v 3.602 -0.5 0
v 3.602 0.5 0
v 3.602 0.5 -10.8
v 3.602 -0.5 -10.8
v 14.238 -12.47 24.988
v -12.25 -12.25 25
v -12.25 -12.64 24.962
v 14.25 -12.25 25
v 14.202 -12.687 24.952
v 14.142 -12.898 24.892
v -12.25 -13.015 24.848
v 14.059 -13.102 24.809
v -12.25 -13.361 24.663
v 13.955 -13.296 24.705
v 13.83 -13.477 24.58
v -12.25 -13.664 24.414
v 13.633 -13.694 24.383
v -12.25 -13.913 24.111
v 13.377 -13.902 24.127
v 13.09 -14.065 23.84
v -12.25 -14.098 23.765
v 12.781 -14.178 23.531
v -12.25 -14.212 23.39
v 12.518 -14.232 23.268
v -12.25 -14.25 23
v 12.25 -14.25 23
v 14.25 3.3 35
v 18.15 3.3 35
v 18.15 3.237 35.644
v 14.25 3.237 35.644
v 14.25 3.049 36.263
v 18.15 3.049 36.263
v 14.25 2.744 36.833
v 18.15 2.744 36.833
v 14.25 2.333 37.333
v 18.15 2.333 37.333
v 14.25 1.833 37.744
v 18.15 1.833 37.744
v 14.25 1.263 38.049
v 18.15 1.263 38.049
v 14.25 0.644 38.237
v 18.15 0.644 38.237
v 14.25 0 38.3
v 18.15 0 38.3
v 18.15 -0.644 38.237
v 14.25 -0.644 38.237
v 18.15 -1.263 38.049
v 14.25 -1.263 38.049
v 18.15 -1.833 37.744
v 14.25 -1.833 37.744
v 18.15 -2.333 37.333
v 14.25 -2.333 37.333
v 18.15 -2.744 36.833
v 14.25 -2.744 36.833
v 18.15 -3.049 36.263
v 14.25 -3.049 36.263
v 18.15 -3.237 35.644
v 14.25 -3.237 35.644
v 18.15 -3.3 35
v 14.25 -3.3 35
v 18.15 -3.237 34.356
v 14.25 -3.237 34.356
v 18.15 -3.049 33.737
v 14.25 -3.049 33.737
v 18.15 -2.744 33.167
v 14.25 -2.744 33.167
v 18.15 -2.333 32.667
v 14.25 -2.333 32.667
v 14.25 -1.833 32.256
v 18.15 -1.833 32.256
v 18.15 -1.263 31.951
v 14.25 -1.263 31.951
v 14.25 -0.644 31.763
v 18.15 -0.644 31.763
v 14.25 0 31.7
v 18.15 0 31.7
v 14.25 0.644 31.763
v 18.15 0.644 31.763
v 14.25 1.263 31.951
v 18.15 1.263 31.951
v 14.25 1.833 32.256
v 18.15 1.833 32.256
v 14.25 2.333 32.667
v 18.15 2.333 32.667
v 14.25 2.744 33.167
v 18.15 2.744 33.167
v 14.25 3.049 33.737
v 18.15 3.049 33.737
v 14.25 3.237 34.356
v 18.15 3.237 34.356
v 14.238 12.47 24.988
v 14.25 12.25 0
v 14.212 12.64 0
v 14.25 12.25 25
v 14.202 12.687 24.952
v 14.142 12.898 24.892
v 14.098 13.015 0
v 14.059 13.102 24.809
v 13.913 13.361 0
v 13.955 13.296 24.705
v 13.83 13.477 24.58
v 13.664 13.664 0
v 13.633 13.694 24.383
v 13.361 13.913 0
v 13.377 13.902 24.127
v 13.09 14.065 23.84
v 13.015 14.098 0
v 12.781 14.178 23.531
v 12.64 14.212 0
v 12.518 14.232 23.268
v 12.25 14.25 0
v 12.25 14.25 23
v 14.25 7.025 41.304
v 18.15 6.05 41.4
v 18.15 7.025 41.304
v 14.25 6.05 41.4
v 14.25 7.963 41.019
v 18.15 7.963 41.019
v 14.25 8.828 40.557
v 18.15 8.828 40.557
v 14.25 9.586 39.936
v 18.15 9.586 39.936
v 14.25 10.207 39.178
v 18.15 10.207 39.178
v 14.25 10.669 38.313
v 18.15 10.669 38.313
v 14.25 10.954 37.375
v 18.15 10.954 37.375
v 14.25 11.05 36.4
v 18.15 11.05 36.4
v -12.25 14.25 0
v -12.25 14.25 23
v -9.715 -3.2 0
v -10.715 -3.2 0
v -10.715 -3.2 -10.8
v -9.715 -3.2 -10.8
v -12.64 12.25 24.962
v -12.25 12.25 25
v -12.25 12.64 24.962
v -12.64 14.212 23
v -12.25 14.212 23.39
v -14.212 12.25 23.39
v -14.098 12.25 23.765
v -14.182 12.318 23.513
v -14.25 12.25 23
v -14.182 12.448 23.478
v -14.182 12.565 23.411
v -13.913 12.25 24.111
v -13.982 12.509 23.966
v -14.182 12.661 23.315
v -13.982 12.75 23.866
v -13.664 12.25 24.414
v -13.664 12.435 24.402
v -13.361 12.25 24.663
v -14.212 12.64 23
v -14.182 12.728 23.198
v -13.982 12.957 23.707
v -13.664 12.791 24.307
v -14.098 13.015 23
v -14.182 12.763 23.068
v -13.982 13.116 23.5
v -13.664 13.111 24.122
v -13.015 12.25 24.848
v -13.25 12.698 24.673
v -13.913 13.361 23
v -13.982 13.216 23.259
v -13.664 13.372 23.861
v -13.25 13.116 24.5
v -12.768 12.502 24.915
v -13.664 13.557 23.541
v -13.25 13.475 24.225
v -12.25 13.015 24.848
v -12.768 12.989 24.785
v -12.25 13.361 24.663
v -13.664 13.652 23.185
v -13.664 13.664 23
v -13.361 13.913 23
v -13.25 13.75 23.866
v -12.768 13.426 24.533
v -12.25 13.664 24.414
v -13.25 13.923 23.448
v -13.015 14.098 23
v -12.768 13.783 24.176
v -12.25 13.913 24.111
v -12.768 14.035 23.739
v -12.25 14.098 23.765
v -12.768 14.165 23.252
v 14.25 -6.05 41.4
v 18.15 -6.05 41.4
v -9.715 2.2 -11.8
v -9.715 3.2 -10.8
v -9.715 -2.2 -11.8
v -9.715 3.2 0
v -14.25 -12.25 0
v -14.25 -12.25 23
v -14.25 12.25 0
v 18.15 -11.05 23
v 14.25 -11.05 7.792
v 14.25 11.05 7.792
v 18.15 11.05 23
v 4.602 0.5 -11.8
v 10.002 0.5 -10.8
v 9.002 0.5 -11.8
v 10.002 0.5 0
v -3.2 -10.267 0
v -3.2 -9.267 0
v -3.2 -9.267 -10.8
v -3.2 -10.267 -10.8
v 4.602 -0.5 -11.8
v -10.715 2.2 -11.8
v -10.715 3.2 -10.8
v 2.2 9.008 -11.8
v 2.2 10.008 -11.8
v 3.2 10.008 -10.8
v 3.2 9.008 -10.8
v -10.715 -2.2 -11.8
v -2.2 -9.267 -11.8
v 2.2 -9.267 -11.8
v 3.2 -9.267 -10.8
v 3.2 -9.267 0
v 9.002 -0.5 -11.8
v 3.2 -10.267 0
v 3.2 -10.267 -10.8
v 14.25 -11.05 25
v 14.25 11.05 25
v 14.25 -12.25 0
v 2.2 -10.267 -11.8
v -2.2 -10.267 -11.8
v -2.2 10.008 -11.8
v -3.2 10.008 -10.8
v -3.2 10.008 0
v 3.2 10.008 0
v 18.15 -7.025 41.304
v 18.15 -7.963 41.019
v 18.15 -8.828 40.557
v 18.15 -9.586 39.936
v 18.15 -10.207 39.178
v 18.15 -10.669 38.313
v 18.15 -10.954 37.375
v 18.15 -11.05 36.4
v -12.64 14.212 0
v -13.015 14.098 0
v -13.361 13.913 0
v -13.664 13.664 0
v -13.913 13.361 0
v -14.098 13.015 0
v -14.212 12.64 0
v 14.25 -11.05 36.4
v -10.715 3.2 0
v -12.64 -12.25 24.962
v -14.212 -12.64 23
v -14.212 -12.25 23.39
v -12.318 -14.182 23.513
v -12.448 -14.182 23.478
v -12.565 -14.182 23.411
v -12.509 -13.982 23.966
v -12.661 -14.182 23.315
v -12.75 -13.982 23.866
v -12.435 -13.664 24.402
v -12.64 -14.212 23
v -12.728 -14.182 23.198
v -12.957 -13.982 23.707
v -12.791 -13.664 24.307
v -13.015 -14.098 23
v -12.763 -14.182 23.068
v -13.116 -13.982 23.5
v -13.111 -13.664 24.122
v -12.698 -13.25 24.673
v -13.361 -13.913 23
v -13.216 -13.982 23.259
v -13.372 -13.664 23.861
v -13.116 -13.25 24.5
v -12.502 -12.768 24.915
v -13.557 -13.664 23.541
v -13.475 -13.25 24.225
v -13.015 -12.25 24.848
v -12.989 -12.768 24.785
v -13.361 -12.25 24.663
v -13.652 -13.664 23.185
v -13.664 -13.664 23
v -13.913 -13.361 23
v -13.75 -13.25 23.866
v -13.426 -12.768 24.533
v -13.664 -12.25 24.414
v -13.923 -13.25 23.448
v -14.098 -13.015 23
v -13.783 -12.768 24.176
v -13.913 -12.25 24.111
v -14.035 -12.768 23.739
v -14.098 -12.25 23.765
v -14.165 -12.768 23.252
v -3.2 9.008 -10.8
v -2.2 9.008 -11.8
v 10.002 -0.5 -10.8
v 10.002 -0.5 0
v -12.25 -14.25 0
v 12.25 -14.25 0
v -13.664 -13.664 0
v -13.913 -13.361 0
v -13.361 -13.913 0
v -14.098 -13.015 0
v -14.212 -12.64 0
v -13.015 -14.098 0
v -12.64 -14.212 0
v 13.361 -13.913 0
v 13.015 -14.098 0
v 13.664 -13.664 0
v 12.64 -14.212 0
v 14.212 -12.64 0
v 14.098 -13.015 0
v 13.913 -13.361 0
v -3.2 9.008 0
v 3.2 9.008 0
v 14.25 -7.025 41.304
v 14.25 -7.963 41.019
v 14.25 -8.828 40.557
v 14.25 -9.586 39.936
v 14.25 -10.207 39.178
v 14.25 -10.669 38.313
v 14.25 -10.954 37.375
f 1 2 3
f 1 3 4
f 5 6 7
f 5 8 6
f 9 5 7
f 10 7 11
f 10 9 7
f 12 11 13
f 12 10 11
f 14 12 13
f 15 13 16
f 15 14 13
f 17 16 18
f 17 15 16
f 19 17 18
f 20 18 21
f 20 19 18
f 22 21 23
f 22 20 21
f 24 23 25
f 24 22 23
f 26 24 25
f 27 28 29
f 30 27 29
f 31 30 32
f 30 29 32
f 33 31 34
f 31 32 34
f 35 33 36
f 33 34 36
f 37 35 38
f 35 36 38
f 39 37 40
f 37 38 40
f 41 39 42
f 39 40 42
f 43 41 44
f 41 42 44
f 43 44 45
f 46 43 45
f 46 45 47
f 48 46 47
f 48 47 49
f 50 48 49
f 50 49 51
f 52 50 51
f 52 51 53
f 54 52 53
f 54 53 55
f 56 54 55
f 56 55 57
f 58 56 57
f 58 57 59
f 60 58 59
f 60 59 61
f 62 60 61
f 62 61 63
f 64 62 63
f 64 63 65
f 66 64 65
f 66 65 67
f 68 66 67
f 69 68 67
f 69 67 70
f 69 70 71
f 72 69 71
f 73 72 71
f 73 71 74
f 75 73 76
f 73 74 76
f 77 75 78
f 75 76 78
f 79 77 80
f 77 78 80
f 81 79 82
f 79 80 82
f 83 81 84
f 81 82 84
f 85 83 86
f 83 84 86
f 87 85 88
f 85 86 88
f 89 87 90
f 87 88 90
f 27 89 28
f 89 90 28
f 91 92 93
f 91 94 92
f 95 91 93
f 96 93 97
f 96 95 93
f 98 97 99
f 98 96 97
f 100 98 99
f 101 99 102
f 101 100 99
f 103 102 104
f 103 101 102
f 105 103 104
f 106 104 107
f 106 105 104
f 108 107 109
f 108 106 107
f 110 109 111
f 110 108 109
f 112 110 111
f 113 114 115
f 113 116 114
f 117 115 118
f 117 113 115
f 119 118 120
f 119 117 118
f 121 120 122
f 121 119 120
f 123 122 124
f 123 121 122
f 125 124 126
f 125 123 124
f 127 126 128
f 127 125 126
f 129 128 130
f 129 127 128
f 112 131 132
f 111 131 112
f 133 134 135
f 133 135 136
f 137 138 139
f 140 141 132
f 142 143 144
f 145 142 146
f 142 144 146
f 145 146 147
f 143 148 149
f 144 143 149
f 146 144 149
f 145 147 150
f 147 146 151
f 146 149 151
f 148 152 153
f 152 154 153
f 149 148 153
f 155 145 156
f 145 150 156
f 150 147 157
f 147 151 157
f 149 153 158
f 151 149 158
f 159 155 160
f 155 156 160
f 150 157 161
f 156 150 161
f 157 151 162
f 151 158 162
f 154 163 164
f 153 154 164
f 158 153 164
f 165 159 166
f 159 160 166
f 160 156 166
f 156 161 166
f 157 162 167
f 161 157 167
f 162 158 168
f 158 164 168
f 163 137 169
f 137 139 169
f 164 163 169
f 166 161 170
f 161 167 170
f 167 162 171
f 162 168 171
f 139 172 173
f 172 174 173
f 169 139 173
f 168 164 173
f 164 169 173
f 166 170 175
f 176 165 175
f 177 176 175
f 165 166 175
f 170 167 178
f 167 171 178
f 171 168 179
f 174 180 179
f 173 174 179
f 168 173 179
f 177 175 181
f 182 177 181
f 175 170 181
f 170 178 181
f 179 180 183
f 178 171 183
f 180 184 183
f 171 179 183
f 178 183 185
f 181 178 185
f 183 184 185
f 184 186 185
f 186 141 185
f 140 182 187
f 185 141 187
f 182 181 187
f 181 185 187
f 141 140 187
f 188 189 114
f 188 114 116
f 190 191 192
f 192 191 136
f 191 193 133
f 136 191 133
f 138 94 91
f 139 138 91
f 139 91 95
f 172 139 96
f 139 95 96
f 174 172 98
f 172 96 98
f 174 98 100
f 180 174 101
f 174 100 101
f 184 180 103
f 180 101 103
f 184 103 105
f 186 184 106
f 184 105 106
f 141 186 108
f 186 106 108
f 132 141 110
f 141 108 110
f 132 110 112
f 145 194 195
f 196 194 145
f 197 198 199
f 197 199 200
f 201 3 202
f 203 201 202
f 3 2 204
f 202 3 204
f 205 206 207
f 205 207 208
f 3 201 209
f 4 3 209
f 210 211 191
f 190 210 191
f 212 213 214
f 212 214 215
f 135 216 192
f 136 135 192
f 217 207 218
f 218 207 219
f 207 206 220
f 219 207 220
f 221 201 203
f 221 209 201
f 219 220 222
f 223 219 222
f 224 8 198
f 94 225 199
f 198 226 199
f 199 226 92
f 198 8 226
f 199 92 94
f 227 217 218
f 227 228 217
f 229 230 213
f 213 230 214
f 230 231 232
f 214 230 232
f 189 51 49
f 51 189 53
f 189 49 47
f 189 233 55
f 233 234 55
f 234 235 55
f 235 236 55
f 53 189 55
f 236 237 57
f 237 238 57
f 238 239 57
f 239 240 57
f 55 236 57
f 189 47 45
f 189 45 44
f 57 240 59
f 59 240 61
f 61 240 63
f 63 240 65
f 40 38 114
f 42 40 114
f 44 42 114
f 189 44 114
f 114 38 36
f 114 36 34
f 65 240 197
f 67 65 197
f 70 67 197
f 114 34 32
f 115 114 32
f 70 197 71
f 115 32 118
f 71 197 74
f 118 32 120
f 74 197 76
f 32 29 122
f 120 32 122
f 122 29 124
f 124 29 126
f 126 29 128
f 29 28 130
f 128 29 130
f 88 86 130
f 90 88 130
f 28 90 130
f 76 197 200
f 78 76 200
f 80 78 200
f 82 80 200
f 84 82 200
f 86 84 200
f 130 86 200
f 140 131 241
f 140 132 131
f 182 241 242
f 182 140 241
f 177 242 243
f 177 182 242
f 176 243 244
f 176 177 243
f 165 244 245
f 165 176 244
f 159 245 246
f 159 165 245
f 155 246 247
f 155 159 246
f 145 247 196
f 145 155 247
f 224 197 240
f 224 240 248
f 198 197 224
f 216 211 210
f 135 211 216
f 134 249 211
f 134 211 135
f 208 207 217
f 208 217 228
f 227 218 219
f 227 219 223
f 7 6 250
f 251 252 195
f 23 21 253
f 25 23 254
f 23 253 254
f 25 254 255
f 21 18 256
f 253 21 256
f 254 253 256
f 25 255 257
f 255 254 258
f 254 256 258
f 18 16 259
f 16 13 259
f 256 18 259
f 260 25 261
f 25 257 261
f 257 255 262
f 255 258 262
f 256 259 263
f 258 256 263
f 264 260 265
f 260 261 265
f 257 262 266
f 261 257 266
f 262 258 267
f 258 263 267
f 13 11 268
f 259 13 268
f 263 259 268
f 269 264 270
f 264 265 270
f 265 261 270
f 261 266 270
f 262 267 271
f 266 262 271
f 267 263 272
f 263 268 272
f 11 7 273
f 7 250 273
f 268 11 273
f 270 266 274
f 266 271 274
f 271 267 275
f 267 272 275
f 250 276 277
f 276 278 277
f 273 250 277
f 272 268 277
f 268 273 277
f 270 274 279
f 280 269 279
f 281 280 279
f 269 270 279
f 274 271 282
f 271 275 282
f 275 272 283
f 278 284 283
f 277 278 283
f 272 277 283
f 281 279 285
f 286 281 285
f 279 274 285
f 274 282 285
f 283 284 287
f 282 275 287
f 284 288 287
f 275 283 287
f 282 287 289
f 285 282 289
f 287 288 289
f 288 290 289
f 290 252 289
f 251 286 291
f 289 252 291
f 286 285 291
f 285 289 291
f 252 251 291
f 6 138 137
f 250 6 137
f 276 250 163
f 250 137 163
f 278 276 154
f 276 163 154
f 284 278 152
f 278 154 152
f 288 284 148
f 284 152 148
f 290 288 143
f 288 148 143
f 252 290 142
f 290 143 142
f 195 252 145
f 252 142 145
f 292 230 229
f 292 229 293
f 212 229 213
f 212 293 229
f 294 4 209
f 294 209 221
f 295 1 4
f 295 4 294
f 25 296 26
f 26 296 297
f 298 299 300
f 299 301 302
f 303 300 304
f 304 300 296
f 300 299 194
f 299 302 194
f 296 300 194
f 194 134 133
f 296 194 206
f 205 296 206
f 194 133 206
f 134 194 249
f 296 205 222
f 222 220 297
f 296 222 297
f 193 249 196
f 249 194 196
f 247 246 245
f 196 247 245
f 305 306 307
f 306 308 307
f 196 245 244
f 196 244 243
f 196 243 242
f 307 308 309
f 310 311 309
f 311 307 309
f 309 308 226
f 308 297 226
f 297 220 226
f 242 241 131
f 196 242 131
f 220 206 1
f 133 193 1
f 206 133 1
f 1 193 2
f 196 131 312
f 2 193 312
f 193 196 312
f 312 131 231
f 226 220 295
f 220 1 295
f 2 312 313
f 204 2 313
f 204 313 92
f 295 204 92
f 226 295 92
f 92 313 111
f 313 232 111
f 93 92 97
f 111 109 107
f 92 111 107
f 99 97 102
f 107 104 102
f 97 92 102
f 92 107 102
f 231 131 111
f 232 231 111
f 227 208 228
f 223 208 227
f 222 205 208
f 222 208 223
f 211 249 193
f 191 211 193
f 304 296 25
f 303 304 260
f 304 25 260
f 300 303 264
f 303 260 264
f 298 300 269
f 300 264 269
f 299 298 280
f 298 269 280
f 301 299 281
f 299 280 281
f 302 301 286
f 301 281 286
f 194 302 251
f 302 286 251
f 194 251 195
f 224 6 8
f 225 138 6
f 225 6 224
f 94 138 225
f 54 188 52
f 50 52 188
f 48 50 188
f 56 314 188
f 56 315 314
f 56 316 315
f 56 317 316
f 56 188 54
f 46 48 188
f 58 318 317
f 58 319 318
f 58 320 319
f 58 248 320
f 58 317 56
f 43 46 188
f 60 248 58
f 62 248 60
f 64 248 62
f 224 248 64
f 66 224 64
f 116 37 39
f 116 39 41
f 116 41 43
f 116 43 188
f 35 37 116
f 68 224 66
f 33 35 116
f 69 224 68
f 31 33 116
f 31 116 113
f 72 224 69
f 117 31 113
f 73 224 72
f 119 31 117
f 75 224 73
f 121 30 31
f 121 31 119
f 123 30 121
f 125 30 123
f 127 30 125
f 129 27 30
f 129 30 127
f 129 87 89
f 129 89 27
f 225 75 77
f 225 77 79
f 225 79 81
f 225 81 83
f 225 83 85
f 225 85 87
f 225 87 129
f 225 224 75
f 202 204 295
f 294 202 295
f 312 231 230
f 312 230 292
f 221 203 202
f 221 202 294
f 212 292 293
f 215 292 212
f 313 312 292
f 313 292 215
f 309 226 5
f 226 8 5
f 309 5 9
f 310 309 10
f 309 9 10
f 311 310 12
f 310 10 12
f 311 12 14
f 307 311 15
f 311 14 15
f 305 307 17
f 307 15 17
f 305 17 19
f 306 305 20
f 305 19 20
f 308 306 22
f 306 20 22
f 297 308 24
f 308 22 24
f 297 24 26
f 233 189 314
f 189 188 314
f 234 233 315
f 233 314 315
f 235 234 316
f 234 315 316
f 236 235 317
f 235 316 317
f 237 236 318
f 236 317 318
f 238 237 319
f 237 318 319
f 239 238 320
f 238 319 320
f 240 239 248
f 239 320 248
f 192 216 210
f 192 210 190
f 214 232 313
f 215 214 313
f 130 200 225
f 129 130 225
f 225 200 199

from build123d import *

# Parameters (mm, degrees)
F0_W      = 28.5
F0_H      = 28.5
F1_DEPTH  = 25
F3_START  = -3.2
F3_DEPTH  = 22.1
F4_DEPTH  = 18.4
F5_R      = 5
F6_R      = 3.3
F7_DEPTH  = 32.401
F8_R      = 2
F9_W      = 1
F9_H      = 6.4
F9_W_2    = 6.4
F9_H_2    = 1
F10_DEPTH = 11.8
F11_SIZE  = 1


with BuildPart() as f1:
    # F0 (on Top) → F1 (new body)
    with BuildSketch(Plane.XY):
        Rectangle(F0_W, F0_H)
    extrude(amount=F1_DEPTH)

    # F2 (on face) → F3 (join)
    with BuildSketch(Plane.XZ.offset(14.25).offset(F3_START)):
        Polygon((18.15, 23), (14.25, 23), (14.25, 7.7921073123), align=None)
    extrude(amount=-F3_DEPTH)

    # F4 (add): a face of the model
    f4_faces = [f1.faces().sort_by_distance(p)[0] for p in [
        (16.2, 0, 23),
    ]]
    extrude(f4_faces, amount=F4_DEPTH)

    # F5
    f5_edges = [f1.edges().sort_by_distance(p)[0] for p in [
        (16.2, -11.05, 41.4),
        (16.2, 11.05, 41.4),
    ]]
    fillet(f5_edges, radius=F5_R)

    # F6 (on face) → F7 (cut, through all)
    with BuildSketch(Plane.YZ.offset(18.15)):
        with Locations((0, 35)):
            Circle(F6_R)
    extrude(amount=-F7_DEPTH, mode=Mode.SUBTRACT)

    # F8
    f8_edges = [f1.edges().sort_by_distance(p)[0] for p in [
        (0, 14.25, 25),
        (-14.25, 0, 25),
        (0, -14.25, 25),
        (-14.25, 14.25, 12.5),
        (-14.25, -14.25, 12.5),
        (14.25, 14.25, 12.5),
        (14.25, -14.25, 12.5),
    ]]
    fillet(f8_edges, radius=F8_R)

    # F9 (on face) → F10 (join)
    with BuildSketch(Plane(origin=(0, 0, 0), x_dir=(1, 0, 0), z_dir=(0, 0, -1))):
        with Locations((-10.2151967585, 0)):
            Rectangle(F9_W, F9_H)
        with Locations((6.8018482998, 0)):
            Rectangle(F9_W_2, F9_H_2)
        with Locations((0, -9.5080761239)):
            Rectangle(F9_W_2, F9_H_2)
        with Locations((0, 9.7670005634)):
            Rectangle(F9_W_2, F9_H_2)
    extrude(amount=F10_DEPTH)

    # F11
    f11_edges = [f1.edges().sort_by_distance(p)[0] for p in [
        (-3.2, 9.508076, -11.8),
        (3.2, 9.508076, -11.8),
        (-10.215197, 3.2, -11.8),
        (-10.215197, -3.2, -11.8),
        (-3.2, -9.767001, -11.8),
        (3.2, -9.767001, -11.8),
        (3.601848, 0, -11.8),
        (10.001848, 0, -11.8),
    ]]
    chamfer(f11_edges, length=F11_SIZE)


solid = f1.part
